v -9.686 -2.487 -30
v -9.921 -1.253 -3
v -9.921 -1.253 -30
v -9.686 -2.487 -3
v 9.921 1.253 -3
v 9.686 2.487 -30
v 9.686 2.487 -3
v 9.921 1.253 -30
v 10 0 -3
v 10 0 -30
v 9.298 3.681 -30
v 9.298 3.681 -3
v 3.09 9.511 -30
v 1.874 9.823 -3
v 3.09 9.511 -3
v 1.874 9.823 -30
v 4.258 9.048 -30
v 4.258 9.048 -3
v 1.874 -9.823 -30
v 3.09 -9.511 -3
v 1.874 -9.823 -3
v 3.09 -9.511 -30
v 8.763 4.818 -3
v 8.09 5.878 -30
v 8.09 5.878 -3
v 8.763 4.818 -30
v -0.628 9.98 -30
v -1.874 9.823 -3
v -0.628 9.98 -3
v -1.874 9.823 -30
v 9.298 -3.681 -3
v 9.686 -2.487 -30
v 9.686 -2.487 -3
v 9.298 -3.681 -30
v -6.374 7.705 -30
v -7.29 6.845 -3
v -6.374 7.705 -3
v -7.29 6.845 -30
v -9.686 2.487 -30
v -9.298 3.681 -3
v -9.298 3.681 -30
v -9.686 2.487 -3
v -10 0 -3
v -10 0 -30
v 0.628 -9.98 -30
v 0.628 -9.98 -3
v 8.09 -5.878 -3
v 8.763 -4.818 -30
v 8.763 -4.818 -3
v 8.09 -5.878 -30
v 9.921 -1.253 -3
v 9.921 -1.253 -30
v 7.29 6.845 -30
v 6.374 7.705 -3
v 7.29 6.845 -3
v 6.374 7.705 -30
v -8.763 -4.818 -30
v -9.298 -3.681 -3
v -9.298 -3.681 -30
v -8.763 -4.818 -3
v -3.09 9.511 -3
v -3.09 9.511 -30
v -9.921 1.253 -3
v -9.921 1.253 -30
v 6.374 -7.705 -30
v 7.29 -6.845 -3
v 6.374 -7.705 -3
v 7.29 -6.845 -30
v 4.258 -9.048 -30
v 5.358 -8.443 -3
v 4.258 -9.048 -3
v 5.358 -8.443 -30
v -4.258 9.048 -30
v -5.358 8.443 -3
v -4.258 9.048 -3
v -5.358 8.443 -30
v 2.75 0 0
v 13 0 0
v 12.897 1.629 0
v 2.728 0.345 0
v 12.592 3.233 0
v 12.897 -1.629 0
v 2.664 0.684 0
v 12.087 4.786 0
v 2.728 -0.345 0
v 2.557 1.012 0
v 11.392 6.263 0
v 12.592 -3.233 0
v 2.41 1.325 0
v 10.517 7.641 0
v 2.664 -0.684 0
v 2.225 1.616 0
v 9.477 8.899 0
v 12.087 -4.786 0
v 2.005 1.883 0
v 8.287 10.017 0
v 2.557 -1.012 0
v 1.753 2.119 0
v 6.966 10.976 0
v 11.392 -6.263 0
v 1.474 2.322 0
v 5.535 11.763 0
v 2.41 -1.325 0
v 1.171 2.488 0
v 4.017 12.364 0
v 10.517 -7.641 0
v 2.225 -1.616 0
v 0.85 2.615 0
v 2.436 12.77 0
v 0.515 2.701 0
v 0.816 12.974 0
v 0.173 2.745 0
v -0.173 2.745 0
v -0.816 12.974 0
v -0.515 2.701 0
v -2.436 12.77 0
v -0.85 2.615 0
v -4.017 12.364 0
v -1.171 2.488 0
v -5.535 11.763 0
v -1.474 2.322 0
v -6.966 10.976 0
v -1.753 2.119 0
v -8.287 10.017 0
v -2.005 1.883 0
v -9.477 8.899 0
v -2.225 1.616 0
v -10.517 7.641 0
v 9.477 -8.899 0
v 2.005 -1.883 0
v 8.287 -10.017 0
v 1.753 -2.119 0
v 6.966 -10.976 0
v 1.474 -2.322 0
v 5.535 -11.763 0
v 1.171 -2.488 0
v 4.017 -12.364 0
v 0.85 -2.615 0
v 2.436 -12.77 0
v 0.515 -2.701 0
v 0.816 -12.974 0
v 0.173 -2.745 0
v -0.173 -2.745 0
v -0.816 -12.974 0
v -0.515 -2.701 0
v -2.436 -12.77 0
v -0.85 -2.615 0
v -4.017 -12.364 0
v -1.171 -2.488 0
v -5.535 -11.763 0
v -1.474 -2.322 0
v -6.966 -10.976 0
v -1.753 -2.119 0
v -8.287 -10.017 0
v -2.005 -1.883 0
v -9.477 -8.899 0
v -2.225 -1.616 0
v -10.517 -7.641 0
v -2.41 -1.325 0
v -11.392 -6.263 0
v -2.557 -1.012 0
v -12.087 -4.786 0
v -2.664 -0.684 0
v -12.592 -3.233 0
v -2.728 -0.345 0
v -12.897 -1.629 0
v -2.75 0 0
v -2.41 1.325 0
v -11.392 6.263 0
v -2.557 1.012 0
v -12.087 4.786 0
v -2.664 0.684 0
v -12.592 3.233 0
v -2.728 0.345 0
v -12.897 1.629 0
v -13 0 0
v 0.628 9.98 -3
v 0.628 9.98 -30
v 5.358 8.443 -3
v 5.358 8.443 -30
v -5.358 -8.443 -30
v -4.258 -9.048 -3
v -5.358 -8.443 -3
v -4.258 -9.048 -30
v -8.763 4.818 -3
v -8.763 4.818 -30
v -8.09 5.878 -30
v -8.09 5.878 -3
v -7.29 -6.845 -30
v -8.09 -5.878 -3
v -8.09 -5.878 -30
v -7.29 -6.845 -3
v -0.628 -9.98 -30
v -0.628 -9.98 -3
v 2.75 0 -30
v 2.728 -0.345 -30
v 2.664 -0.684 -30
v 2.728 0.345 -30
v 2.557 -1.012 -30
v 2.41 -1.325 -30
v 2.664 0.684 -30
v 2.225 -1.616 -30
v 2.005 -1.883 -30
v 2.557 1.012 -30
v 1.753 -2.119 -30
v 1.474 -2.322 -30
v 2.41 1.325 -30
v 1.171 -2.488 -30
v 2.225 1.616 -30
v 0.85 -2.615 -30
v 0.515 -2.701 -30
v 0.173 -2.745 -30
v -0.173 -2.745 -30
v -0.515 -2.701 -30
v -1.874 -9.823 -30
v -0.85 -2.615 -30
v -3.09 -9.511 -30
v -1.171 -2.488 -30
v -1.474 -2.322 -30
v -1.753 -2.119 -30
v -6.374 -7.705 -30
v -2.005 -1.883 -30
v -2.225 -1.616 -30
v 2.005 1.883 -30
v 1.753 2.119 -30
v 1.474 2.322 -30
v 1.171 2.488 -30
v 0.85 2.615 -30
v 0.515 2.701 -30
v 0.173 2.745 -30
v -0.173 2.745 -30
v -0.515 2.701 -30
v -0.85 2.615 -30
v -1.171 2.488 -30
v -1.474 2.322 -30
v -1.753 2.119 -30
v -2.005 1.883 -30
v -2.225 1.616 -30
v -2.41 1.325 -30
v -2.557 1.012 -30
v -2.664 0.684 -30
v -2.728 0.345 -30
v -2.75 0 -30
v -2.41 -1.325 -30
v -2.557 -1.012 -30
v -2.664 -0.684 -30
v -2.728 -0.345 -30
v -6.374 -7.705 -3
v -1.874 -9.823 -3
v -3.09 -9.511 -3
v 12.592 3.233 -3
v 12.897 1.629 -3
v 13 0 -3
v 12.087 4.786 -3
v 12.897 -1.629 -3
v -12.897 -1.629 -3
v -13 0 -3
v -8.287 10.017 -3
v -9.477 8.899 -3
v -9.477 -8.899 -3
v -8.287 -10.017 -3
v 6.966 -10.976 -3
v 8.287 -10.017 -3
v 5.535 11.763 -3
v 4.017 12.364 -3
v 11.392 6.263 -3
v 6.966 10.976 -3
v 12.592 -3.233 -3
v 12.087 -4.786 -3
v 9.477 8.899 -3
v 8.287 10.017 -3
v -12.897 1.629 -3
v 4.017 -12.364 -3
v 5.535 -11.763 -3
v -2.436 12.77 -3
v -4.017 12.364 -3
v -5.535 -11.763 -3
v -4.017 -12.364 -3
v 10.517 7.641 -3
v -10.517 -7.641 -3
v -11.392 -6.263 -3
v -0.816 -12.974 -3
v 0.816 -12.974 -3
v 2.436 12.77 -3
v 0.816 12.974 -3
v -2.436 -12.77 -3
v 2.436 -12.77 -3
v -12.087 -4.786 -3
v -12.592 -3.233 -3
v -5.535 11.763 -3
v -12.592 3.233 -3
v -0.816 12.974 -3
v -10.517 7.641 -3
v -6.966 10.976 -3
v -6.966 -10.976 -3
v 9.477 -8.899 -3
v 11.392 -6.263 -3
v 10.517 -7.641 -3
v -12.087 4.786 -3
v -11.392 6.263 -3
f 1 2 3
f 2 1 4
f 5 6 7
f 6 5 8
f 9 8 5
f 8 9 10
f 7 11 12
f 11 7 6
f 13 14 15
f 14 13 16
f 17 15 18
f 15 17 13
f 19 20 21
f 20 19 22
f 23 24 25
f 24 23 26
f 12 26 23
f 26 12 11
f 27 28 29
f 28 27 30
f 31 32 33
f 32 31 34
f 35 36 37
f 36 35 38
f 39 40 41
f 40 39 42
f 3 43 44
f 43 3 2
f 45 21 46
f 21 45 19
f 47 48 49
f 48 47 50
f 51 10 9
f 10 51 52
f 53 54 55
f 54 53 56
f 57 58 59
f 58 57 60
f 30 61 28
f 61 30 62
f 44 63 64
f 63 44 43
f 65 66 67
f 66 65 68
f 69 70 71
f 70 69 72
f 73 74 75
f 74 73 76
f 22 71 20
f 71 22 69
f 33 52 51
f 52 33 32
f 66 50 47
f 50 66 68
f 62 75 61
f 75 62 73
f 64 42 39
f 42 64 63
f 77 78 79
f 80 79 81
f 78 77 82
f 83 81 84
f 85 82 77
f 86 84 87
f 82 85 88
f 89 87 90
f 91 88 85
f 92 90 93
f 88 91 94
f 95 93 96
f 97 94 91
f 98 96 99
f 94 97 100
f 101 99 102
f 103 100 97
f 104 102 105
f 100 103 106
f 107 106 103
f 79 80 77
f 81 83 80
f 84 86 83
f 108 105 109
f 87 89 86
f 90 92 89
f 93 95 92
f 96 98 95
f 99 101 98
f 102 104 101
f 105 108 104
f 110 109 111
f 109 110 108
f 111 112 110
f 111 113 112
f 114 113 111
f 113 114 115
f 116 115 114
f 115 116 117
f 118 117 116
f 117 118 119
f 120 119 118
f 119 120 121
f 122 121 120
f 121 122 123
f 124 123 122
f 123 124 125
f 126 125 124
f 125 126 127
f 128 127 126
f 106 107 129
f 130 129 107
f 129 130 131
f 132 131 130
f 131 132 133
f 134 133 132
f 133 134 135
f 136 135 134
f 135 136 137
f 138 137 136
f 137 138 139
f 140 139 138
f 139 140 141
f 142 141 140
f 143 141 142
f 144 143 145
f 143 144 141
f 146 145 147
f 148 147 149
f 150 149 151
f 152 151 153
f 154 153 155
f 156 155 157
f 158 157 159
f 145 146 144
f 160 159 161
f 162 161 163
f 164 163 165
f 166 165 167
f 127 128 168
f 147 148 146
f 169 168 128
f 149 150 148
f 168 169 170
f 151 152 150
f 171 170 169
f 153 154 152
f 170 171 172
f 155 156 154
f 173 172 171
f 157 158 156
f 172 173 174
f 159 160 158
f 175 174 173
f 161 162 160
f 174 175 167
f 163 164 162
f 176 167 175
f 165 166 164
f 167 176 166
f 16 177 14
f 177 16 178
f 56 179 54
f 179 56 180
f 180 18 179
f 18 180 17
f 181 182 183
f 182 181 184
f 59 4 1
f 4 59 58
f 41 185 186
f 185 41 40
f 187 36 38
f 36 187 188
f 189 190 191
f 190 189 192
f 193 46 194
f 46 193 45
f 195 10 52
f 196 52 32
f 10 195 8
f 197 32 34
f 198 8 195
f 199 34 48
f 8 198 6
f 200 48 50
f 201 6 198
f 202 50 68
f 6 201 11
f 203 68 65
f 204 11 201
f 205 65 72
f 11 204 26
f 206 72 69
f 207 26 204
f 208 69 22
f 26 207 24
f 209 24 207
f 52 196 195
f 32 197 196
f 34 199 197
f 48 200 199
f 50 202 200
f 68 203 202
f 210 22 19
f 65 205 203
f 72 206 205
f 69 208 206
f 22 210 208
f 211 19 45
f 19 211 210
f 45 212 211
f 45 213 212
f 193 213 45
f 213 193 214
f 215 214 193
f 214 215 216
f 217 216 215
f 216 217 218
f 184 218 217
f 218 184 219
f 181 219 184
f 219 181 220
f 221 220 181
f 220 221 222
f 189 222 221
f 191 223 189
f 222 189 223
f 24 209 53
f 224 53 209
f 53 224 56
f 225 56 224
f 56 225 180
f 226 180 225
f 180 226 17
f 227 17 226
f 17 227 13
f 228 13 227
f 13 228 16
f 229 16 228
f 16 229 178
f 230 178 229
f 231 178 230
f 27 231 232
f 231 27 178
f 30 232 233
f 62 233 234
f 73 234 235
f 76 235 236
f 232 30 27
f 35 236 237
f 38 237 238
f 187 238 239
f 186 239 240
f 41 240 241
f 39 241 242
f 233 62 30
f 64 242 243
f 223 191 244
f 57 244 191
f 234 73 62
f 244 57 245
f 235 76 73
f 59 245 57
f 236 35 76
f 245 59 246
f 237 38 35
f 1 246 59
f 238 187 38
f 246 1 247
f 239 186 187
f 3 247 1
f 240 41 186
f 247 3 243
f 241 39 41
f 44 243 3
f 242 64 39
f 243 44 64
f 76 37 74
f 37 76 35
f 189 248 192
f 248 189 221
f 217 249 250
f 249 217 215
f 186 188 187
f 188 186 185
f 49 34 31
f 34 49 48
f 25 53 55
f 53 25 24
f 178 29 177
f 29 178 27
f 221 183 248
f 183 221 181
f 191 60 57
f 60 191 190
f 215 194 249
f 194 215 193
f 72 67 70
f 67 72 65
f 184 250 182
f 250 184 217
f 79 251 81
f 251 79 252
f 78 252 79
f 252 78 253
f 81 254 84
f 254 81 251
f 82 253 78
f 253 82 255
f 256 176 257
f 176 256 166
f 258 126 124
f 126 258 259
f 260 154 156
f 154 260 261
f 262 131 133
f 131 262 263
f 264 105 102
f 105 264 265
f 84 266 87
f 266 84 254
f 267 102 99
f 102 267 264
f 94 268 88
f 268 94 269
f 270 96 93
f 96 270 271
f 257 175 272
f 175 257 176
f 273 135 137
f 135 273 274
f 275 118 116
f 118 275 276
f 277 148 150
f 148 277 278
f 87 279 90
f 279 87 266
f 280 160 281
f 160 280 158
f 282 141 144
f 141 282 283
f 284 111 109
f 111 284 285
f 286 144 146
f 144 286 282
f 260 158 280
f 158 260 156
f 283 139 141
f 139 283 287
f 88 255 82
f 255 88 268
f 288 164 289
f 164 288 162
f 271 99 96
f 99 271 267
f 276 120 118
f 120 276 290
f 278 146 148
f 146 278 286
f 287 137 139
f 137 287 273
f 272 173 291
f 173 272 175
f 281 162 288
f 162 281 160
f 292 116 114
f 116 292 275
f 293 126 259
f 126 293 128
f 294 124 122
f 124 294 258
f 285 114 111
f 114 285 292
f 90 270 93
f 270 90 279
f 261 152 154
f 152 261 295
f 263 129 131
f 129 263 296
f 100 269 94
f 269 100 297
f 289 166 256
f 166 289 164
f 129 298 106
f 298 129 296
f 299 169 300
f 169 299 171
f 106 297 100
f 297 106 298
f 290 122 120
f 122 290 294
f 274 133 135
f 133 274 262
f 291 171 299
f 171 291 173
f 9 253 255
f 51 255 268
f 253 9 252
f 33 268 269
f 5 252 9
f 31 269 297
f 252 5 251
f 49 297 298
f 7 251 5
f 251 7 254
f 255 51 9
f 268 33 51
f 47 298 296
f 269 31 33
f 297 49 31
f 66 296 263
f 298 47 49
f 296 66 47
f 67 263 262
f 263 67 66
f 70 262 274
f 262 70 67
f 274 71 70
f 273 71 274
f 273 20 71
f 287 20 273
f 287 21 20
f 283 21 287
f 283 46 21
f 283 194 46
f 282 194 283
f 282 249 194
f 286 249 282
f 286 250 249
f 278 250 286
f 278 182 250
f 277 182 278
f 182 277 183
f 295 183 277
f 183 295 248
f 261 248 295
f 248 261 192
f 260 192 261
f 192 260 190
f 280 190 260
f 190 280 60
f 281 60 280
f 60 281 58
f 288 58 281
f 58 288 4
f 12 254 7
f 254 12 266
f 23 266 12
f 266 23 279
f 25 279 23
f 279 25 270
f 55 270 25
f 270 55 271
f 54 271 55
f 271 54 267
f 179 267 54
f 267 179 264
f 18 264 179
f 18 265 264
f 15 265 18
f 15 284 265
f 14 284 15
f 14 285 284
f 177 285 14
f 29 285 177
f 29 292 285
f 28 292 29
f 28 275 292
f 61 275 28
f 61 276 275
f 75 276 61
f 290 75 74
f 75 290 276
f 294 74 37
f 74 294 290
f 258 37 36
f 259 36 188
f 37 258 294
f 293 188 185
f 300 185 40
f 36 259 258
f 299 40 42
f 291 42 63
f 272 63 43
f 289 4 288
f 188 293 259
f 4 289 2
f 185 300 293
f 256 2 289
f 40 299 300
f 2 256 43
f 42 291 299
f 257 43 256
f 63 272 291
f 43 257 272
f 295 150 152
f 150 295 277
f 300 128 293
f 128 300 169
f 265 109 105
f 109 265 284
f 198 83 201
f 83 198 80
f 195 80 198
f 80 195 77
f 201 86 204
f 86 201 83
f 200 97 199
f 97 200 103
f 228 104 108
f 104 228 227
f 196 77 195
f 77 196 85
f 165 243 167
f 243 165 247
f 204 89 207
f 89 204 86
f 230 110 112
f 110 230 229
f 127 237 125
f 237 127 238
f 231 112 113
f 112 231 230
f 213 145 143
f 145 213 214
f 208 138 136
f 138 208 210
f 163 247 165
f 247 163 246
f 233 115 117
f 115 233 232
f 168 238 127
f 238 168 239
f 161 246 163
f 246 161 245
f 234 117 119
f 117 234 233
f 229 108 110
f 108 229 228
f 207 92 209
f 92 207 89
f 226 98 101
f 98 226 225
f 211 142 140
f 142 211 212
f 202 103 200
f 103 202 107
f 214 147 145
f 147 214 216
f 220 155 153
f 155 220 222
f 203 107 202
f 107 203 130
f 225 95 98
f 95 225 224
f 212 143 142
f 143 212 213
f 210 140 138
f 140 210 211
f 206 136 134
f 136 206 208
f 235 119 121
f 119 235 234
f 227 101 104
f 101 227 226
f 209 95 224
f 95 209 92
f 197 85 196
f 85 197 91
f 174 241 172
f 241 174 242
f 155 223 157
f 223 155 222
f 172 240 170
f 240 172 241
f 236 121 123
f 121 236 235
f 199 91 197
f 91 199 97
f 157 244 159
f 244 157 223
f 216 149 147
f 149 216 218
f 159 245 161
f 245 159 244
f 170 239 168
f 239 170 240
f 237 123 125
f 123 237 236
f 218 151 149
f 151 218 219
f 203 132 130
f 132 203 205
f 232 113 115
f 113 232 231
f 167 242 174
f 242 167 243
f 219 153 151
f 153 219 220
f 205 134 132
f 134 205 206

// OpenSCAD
$fn = 50;


difference() {
	union() {
		translate(v = [0, 0, -30.0000000000]) {
			cylinder(h = 30, r = 10.0000000000);
		}
		translate(v = [0, 0, -3.0000000000]) {
			cylinder(h = 3, r = 13.0000000000);
		}
	}
	union() {
		#translate(v = [0, 0, -30]) {
			cylinder(h = 30, r = 2.7500000000);
		}
	}
}
